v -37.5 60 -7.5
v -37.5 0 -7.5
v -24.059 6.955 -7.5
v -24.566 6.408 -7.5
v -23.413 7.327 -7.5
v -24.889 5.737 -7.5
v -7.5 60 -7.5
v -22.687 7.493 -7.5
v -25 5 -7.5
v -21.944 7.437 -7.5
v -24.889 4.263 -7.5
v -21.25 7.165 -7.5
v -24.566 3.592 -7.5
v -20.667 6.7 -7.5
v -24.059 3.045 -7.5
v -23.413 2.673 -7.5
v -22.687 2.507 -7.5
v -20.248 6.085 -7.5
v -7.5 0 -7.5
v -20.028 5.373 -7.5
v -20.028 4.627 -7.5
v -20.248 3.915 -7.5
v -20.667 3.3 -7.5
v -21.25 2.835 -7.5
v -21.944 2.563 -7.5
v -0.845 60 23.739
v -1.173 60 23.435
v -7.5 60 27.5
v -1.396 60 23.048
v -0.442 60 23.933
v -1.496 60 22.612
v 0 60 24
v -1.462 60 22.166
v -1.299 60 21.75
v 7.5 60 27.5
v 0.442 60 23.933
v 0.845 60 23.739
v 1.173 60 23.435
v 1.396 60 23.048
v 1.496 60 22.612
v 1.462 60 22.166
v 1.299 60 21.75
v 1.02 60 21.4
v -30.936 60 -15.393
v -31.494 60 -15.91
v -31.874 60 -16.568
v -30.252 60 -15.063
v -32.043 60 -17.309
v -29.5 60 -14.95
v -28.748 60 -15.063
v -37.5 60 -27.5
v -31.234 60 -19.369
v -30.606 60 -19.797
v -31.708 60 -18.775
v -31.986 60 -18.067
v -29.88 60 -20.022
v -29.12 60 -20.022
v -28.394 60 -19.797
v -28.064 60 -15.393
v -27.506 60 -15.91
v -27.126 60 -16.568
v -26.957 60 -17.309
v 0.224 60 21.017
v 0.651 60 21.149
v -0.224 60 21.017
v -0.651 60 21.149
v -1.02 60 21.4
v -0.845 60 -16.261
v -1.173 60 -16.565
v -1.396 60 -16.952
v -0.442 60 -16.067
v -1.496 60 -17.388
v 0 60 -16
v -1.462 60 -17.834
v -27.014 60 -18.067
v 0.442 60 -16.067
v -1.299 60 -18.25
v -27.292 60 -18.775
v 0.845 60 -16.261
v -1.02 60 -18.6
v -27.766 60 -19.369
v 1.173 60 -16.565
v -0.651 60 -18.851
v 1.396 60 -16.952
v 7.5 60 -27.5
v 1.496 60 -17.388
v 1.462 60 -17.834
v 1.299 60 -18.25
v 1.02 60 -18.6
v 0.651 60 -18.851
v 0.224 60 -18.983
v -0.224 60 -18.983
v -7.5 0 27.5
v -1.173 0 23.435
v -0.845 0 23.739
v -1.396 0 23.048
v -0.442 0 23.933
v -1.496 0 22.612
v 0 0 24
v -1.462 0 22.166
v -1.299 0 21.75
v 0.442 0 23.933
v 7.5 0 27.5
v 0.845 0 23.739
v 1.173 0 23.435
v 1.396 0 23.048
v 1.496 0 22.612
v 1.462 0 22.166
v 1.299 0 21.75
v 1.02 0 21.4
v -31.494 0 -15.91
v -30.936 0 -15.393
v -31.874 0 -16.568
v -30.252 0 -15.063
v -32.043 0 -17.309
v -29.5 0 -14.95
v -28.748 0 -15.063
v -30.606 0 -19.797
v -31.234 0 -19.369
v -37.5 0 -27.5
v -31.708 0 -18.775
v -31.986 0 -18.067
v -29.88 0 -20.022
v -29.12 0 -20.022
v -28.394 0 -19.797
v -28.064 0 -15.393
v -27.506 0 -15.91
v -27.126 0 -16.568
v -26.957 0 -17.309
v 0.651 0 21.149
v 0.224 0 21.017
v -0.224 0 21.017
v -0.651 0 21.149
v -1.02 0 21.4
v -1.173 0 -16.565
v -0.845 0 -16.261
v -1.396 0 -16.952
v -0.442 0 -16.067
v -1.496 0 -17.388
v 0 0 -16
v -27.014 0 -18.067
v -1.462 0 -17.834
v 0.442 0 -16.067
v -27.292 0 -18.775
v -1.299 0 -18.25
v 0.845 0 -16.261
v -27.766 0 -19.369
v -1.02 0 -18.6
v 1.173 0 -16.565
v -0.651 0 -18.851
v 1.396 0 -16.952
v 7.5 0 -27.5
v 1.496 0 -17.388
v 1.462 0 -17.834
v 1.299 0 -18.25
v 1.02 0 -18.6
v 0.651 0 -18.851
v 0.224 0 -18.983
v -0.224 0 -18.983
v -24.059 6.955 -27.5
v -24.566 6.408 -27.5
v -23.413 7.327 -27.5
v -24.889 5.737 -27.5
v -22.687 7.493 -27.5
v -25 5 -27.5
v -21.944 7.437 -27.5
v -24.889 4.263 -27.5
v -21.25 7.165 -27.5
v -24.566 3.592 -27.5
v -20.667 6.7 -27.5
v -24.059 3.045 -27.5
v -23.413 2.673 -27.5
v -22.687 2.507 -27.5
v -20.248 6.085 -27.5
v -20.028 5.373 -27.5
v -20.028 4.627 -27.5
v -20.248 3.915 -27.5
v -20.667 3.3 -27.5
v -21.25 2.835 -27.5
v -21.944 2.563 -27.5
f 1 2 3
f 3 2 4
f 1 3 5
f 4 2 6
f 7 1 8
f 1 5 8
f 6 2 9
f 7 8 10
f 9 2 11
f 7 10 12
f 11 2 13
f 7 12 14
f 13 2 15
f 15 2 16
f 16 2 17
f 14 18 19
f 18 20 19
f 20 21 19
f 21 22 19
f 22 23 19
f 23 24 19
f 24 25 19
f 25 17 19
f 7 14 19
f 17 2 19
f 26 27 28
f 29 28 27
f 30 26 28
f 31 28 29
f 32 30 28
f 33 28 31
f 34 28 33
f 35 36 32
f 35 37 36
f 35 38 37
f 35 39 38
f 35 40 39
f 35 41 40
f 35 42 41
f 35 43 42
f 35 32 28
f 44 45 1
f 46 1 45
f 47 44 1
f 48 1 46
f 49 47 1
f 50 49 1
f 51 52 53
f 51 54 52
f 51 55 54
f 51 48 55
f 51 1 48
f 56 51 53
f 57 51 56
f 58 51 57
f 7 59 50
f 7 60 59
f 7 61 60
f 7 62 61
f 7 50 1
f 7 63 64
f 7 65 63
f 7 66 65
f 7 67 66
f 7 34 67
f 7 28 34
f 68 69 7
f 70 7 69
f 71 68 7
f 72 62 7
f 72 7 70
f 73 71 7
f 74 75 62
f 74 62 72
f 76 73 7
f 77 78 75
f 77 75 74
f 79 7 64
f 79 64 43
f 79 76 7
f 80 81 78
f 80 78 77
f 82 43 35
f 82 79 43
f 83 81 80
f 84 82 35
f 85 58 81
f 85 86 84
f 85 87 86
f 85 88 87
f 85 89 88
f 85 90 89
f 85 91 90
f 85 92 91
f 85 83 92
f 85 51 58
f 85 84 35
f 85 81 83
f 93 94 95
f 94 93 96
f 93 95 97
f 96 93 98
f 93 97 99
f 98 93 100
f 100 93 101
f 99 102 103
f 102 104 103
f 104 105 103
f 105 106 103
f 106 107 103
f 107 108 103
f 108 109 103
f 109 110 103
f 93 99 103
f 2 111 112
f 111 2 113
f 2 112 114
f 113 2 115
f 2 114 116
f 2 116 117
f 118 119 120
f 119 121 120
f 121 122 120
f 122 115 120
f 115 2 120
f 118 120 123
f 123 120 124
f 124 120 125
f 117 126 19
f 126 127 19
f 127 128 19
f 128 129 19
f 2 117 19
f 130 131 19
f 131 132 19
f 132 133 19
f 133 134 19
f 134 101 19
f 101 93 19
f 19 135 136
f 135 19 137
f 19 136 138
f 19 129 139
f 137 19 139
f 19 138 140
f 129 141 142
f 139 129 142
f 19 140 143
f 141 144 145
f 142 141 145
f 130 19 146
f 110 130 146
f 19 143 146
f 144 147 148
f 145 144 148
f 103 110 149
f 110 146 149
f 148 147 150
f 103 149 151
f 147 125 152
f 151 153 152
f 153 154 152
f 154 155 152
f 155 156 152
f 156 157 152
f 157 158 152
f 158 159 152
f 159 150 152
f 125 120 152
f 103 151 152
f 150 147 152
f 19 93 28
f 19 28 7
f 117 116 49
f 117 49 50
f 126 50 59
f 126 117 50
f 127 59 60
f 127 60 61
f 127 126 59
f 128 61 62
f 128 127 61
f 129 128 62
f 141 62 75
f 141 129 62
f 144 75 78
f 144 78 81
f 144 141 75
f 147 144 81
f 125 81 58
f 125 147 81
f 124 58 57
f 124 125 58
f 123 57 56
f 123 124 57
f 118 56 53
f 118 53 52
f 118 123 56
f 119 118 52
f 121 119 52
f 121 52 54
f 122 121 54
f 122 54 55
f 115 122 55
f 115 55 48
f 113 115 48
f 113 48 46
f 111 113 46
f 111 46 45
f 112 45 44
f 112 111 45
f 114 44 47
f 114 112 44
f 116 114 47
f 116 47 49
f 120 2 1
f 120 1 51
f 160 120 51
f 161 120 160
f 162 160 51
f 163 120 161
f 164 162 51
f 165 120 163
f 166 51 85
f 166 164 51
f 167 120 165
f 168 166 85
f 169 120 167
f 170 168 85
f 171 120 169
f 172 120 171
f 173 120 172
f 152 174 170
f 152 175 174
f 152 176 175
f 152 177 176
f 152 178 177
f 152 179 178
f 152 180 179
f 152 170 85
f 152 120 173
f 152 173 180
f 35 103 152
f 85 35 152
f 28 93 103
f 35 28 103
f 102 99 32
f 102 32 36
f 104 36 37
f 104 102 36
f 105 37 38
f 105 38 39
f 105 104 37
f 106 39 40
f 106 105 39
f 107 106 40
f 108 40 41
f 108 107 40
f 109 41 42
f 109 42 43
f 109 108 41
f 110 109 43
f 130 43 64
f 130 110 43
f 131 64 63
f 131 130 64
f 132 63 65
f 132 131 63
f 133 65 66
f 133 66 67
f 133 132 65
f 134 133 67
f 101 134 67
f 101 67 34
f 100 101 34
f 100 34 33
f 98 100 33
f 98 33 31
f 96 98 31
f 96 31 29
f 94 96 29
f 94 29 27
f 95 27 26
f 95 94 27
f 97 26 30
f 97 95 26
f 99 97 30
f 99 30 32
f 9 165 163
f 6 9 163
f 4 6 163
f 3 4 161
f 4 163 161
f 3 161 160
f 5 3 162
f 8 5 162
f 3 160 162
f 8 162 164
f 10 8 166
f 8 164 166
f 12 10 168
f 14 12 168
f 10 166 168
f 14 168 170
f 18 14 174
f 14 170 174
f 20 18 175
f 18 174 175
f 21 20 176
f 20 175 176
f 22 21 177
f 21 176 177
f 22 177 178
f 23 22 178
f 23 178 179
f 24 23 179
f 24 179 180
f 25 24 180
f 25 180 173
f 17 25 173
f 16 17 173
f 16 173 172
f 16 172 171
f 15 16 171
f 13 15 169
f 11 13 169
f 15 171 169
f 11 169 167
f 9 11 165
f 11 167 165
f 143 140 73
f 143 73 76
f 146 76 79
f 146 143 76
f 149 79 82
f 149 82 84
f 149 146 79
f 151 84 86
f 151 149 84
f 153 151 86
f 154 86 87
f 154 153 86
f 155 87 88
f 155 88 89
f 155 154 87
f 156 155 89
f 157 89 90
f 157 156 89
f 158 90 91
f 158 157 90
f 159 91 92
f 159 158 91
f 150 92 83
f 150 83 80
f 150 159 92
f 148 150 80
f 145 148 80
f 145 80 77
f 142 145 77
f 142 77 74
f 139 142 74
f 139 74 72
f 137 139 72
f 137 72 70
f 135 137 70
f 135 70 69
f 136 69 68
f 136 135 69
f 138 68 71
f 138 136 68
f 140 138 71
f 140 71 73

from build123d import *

# Parameters (mm, degrees)
SKETCH1_W           = 15
SKETCH1_H           = 55
SKETCH1_R           = 1.5
SKETCH1_W_2         = 30
SKETCH1_H_2         = 20
SKETCH1_R_2         = 2.55
BOSS_EXTRUDE1_DEPTH = 60
SKETCH2_R           = 2.5
CUT_EXTRUDE1_DEPTH  = 20


with BuildPart() as part:
    # Sketch1 → Boss-Extrude1 (new body)
    # profile 1 of 2: a face of its own
    with BuildSketch(Plane(origin=(0, 0, 0), x_dir=(1, 0, 0), z_dir=(0, 1, 0))):
        Rectangle(SKETCH1_W, SKETCH1_H)
        with Locations(Location((0, -22.5, 0), (0, 0, 270))):
            Circle(SKETCH1_R, mode=Mode.SUBTRACT)
        with Locations(Location((0, 17.5, 0), (0, 0, 270))):
            Circle(SKETCH1_R, mode=Mode.SUBTRACT)
    # profile 2 of 2: a face of its own
    with BuildSketch(Plane(origin=(0, 0, 0), x_dir=(1, 0, 0), z_dir=(0, 1, 0))):
        with Locations((-22.5, 17.5)):
            Rectangle(SKETCH1_W_2, SKETCH1_H_2)
        with Locations(Location((-29.5, 17.5, 0), (0, 0, 270))):
            Circle(SKETCH1_R_2, mode=Mode.SUBTRACT)
    extrude(amount=BOSS_EXTRUDE1_DEPTH)

    # Sketch2 → Cut-Extrude1 (cut)
    with BuildSketch(Plane(origin=(0, 0, -27.5), x_dir=(-1, 0, 0), z_dir=(0, 0, -1))):
        with Locations((22.5, 5)):
            Circle(SKETCH2_R)
    extrude(amount=-CUT_EXTRUDE1_DEPTH, mode=Mode.SUBTRACT)


solid = part.part
